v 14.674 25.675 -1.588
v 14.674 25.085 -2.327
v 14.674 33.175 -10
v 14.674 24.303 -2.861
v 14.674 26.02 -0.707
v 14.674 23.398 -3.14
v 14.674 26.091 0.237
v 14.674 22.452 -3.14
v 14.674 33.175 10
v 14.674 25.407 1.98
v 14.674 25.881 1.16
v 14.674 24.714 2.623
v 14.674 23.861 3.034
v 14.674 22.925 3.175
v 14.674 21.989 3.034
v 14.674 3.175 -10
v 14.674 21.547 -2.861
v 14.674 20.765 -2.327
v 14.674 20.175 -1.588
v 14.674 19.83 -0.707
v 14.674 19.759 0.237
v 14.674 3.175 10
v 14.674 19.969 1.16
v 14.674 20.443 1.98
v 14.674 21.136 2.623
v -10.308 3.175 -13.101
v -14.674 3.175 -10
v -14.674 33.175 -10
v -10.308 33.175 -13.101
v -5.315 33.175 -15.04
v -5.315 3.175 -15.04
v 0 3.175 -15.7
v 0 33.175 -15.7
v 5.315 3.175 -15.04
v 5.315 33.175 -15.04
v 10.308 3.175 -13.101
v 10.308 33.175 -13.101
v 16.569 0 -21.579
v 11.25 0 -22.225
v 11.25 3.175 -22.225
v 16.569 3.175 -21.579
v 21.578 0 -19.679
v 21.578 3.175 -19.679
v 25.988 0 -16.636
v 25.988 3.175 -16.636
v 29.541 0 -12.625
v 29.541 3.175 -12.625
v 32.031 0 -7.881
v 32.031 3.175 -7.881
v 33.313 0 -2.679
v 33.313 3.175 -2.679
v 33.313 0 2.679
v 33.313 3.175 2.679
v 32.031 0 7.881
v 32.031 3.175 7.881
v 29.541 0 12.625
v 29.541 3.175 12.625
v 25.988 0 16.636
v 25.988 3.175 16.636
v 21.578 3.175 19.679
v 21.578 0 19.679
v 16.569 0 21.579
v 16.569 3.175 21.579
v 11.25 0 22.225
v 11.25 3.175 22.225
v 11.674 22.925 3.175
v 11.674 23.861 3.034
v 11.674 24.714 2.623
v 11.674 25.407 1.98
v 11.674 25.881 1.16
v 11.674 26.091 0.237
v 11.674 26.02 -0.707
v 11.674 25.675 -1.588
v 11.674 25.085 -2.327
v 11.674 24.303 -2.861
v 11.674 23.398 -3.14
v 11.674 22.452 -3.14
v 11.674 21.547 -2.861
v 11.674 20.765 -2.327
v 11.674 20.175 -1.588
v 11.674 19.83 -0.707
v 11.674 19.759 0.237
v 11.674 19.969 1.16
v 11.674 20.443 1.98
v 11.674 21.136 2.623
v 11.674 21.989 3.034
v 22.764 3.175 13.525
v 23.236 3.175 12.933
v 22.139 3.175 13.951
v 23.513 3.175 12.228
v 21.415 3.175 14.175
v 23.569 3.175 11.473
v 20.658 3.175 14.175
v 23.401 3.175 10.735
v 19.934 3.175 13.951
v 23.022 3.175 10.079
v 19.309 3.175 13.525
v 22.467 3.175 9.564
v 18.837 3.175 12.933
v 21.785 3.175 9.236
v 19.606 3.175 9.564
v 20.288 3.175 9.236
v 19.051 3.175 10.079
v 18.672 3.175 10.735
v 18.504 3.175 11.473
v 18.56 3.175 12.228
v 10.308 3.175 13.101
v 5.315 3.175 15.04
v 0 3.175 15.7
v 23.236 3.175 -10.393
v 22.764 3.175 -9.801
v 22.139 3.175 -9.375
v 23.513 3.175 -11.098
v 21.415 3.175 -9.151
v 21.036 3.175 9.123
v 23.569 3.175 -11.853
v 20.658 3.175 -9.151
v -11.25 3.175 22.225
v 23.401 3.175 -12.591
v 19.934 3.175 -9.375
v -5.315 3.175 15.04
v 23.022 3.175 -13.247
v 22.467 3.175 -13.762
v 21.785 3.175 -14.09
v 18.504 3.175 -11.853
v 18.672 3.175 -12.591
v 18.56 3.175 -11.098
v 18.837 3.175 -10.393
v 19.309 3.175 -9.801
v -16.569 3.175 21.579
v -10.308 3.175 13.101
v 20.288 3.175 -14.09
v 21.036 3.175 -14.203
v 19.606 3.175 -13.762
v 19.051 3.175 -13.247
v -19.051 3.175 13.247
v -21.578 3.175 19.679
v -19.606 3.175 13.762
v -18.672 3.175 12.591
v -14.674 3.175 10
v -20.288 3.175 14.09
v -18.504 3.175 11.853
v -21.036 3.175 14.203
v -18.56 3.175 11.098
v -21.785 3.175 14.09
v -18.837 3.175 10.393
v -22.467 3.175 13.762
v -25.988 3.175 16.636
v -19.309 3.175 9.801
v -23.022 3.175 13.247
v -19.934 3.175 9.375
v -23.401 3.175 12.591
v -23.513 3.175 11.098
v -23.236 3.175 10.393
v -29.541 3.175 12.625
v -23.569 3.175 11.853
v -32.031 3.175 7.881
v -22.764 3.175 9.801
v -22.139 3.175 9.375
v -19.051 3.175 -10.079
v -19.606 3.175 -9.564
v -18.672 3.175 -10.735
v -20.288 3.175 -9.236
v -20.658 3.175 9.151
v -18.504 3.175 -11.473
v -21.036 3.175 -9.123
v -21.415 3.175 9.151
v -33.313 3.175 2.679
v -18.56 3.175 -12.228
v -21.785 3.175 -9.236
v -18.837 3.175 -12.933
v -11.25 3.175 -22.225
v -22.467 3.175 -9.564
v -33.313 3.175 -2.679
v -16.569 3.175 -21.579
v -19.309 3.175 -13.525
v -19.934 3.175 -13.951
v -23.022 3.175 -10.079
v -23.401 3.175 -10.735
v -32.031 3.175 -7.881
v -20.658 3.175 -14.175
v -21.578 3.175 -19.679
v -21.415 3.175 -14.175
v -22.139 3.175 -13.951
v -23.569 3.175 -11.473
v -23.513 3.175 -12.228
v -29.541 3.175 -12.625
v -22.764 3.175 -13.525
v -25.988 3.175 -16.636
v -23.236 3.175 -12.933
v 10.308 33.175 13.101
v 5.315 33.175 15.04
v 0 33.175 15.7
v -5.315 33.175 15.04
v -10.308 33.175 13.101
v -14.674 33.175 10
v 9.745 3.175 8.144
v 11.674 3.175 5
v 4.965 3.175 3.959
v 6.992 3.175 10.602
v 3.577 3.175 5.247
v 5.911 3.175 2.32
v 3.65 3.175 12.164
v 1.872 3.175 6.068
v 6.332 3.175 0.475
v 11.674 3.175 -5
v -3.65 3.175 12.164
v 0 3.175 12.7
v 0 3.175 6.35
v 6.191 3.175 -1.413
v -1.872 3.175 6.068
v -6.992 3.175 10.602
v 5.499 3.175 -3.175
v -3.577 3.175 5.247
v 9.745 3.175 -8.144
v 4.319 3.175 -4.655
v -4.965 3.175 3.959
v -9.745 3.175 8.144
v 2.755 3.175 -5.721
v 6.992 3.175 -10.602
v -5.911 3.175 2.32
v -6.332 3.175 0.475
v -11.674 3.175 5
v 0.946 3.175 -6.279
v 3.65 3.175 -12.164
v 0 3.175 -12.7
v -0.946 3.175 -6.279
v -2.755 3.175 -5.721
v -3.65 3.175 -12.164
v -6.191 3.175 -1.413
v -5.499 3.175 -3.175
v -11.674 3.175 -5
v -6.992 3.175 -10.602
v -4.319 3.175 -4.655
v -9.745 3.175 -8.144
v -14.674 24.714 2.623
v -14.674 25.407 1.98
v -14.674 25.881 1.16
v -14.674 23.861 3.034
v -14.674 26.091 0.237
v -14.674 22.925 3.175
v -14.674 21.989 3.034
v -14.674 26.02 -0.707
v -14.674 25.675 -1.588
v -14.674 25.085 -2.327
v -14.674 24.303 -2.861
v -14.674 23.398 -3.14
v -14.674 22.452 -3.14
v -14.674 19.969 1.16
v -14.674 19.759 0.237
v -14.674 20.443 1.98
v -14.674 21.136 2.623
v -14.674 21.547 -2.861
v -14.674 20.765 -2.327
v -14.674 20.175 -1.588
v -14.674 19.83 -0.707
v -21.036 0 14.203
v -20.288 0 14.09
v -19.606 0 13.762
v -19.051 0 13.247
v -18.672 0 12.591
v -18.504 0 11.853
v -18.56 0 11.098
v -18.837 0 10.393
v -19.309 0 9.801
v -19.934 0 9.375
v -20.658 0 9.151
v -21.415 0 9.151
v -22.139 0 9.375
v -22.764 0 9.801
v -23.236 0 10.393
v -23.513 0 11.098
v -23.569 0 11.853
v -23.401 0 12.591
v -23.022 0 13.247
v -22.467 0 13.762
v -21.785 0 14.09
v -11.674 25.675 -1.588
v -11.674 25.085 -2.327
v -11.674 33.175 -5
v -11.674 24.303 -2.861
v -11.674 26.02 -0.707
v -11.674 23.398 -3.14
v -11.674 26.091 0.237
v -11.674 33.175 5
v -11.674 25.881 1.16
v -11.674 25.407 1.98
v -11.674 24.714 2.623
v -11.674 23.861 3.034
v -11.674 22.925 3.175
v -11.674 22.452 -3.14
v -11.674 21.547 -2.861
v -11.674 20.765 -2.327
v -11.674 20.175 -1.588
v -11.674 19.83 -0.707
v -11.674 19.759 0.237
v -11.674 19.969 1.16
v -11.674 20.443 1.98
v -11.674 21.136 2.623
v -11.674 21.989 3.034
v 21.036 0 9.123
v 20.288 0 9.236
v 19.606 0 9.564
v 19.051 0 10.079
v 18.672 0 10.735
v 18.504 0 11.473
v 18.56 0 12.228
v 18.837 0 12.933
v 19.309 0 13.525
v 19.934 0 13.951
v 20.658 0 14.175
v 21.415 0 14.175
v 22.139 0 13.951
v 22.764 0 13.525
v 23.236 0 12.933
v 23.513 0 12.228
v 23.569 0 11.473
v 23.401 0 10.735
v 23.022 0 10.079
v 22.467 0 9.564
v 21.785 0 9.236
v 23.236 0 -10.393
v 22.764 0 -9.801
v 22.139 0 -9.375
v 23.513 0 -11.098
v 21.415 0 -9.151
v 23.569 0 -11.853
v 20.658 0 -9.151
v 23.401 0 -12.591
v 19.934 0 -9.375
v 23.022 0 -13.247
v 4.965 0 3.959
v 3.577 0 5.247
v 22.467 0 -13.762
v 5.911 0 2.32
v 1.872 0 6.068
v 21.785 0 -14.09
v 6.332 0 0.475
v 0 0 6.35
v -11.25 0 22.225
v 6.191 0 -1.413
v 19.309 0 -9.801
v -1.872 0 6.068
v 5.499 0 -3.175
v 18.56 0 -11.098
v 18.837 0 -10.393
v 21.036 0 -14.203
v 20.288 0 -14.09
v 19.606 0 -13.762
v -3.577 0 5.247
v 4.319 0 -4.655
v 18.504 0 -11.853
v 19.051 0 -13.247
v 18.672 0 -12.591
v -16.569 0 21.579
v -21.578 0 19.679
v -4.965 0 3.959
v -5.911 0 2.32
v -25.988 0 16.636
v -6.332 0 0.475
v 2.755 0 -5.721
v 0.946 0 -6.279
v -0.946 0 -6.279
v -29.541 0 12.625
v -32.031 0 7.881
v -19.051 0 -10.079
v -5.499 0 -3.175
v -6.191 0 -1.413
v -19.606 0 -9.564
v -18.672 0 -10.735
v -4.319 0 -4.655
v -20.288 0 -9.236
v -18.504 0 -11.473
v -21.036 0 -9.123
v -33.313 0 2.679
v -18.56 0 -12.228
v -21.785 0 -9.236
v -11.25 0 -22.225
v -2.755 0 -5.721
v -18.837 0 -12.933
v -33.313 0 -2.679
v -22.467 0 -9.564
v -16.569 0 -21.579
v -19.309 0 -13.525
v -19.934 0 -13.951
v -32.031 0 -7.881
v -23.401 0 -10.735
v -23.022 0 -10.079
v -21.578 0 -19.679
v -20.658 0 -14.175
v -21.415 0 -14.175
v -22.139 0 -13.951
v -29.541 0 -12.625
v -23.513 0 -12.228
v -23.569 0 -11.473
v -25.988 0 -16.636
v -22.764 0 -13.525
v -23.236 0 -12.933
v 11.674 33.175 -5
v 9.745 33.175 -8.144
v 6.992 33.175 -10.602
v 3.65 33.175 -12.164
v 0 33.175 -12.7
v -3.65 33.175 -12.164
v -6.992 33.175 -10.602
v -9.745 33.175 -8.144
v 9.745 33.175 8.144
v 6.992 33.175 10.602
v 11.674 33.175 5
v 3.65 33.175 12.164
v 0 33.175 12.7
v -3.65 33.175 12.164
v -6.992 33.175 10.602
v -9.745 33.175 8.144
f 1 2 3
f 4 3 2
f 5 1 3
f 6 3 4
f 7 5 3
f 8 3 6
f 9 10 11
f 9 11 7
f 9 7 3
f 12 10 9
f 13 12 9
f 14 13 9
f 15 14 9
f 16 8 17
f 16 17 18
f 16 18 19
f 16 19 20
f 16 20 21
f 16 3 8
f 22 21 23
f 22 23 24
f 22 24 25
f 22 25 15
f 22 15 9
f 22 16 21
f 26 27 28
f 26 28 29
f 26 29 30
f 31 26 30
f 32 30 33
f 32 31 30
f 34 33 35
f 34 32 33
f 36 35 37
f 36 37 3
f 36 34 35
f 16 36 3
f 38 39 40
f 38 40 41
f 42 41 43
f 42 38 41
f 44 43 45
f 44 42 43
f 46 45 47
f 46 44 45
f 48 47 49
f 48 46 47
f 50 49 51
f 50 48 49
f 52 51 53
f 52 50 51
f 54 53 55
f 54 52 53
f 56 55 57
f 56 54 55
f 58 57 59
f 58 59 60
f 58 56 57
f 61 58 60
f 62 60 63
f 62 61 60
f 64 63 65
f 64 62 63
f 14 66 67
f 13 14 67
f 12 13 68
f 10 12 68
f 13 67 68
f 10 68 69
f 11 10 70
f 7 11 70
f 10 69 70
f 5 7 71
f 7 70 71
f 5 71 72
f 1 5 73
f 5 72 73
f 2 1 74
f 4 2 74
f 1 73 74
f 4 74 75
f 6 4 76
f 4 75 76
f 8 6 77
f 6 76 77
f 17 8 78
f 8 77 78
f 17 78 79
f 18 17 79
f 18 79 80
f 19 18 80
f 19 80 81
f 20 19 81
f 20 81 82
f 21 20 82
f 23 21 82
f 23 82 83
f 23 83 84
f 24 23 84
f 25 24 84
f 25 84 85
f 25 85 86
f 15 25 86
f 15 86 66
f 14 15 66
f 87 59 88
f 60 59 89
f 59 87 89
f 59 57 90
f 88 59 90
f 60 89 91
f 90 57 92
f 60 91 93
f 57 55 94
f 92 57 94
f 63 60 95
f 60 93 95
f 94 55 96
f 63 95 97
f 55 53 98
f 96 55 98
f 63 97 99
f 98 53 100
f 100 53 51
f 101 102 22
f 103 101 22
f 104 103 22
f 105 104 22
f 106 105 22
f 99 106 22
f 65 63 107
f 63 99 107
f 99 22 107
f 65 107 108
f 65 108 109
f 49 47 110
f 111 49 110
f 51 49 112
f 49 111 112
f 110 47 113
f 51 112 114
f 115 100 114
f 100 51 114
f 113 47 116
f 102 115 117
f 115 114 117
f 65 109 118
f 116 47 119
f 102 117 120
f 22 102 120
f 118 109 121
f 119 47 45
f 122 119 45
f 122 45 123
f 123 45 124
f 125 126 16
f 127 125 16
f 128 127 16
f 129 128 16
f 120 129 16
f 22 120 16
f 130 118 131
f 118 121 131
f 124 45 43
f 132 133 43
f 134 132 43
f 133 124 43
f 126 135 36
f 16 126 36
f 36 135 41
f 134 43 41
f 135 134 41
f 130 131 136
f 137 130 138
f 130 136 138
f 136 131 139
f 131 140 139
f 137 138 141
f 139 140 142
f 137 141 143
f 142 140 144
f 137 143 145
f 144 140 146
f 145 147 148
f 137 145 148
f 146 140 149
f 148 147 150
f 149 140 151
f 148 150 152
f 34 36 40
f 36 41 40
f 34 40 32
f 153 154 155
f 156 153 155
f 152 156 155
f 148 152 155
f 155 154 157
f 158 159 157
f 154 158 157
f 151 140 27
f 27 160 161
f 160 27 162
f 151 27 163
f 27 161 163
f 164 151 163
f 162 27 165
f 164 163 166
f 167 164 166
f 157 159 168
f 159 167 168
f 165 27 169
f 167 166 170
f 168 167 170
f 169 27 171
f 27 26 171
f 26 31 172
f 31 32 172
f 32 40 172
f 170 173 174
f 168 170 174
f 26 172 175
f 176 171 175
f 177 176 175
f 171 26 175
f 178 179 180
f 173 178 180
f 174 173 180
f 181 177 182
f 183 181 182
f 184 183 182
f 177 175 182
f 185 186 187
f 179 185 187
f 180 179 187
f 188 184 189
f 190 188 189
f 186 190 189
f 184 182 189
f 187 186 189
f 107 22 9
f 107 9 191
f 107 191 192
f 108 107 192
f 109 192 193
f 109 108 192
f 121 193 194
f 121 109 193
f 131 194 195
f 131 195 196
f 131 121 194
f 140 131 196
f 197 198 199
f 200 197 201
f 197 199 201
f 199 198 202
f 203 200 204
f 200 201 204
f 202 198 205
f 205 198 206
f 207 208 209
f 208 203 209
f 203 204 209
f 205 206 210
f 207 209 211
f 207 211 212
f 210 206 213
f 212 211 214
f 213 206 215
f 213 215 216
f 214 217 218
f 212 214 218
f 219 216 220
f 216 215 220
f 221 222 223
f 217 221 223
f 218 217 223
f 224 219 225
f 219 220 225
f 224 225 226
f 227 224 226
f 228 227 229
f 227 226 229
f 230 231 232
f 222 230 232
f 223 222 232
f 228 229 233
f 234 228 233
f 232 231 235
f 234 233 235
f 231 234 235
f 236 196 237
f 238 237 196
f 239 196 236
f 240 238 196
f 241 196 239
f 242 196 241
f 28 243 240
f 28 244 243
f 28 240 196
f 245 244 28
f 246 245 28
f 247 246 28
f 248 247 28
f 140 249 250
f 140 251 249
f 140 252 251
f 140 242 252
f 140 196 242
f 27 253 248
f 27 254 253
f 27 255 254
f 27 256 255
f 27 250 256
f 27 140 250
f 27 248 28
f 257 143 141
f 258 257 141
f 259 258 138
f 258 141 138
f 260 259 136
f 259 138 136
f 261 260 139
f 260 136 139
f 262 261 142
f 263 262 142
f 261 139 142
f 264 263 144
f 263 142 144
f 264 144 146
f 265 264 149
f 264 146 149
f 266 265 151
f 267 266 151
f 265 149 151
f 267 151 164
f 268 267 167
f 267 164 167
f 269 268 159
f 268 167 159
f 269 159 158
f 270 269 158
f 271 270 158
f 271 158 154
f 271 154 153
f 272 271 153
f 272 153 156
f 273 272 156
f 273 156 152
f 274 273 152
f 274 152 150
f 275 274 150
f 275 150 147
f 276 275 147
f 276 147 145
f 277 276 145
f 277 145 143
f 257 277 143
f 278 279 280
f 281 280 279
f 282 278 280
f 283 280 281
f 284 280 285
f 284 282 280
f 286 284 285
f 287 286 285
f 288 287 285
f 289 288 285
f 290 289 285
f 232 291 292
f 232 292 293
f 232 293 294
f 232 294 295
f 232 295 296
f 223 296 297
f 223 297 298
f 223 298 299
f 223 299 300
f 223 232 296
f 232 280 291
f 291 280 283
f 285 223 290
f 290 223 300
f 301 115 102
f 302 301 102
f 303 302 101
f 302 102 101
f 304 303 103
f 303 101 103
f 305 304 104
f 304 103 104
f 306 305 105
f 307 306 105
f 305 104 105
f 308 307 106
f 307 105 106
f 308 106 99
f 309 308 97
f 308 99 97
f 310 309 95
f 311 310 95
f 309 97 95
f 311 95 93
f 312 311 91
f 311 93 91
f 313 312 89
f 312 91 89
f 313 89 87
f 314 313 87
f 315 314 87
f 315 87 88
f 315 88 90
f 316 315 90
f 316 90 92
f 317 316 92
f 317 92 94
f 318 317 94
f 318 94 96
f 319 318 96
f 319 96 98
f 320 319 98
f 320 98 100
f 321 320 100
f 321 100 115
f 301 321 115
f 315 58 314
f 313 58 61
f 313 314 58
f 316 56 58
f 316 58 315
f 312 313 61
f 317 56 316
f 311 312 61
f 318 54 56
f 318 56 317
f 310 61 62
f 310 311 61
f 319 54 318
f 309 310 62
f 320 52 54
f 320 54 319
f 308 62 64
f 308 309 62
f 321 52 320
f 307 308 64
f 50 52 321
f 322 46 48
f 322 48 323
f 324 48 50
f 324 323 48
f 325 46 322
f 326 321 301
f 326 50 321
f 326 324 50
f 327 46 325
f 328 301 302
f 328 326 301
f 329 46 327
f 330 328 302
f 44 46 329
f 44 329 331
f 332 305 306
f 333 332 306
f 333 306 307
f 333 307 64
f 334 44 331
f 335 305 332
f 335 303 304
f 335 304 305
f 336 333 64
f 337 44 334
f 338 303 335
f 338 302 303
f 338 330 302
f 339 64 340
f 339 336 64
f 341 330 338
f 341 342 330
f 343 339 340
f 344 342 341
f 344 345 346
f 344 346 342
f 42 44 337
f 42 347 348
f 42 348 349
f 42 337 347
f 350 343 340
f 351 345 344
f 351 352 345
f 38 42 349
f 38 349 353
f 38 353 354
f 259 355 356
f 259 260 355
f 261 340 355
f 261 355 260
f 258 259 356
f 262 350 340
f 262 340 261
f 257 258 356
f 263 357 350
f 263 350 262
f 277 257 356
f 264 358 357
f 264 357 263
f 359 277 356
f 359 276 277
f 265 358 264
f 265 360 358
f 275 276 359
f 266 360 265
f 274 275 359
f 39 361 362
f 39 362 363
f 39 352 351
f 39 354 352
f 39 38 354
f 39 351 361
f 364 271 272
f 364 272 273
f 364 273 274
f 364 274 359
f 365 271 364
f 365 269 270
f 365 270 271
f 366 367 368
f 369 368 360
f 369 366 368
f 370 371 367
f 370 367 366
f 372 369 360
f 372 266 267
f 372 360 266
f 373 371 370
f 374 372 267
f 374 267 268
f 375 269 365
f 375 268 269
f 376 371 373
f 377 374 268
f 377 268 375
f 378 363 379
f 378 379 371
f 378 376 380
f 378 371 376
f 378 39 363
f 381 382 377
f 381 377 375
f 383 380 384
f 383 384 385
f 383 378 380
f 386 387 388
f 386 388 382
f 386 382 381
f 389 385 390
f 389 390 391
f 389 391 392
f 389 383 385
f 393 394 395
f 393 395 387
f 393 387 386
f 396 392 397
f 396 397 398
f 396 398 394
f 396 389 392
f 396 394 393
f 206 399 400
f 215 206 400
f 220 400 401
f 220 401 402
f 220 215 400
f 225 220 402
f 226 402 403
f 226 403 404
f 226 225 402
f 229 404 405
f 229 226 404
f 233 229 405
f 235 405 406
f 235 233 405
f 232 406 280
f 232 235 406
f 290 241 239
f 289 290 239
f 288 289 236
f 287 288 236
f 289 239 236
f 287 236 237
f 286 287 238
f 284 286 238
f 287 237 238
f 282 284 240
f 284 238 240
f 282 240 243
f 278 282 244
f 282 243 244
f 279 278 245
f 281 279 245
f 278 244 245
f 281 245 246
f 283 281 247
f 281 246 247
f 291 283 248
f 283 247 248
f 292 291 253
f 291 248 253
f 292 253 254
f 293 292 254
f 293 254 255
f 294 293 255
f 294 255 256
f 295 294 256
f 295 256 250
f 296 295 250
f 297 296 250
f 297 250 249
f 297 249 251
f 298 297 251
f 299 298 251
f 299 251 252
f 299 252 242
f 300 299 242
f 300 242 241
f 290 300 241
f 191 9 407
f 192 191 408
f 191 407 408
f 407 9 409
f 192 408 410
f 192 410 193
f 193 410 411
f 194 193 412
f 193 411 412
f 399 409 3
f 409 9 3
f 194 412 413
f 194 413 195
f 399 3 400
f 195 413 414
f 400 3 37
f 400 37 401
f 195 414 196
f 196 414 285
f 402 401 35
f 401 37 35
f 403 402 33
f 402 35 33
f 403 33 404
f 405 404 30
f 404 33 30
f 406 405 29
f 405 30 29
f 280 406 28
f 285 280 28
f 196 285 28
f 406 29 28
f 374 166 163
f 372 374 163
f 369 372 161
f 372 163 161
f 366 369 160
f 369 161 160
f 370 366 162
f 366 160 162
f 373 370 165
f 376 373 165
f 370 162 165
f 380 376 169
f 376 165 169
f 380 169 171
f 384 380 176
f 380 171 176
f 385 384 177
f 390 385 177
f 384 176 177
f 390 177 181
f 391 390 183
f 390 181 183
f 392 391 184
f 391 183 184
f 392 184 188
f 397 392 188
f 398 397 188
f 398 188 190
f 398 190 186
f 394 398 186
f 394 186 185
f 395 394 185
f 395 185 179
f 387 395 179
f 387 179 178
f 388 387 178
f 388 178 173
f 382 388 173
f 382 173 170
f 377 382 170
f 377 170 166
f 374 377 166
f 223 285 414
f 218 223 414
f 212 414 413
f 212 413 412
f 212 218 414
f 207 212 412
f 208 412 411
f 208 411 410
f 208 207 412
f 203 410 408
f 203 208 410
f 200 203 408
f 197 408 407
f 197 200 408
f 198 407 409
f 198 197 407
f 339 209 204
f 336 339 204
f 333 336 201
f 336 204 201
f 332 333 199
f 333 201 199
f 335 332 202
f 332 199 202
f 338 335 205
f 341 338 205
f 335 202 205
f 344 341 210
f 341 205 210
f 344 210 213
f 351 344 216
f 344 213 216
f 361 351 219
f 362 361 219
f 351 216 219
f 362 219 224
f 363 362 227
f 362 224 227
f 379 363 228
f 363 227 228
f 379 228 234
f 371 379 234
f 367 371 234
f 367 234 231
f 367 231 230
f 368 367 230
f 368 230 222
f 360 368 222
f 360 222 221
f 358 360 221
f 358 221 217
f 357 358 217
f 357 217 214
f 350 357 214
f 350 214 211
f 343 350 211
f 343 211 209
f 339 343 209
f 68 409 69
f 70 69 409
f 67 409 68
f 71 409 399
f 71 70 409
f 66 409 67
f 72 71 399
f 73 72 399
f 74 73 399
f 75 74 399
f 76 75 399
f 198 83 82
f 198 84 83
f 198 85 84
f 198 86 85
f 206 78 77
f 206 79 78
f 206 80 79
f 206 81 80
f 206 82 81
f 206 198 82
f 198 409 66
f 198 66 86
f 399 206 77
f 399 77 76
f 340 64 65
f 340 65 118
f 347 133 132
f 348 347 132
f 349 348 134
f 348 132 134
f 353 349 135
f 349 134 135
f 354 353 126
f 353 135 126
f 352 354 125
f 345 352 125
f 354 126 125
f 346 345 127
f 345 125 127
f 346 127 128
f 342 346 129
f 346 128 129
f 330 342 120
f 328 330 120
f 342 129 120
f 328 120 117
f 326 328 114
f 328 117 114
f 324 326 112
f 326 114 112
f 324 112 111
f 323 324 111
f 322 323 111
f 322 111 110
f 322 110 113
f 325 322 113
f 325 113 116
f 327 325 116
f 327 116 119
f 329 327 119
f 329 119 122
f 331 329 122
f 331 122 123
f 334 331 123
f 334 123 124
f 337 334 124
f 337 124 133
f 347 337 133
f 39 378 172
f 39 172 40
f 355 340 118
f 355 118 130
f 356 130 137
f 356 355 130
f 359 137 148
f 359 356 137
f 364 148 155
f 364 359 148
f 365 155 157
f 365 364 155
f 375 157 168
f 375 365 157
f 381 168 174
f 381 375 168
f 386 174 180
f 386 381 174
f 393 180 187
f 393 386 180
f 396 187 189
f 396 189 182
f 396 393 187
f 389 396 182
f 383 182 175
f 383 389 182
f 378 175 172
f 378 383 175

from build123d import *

# Parameters (mm, degrees)
BOSS_EXTRUDE1_DEPTH = 3.175
SKETCH2_R           = 2.54
CUT_EXTRUDE1_DEPTH  = 41.306412331
BOSS_EXTRUDE2_DEPTH = 30
SKETCH4_R           = 6.35
CUT_EXTRUDE2_DEPTH  = 51.145052099
SKETCH6_R           = 3.175
CUT_EXTRUDE3_DEPTH  = 66.447021029


with BuildPart() as part:
    # Sketch1 → Boss-Extrude1 (new body)
    with BuildSketch(Plane(origin=(0, 0, 0), x_dir=(1, 0, 0), z_dir=(0, 1, 0))):
        with BuildLine():
            Line((-11.25, 22.225), (11.25, 22.225))
            ThreePointArc((11.25, 22.225), (33.475, 0), (11.25, -22.225))
            Line((11.25, -22.225), (-11.25, -22.225))
            ThreePointArc((-11.25, -22.225), (-33.475, 0), (-11.25, 22.225))
        make_face()
    extrude(amount=BOSS_EXTRUDE1_DEPTH)

    # Sketch2 → Cut-Extrude1 (cut, through all)
    with BuildSketch(Plane(origin=(0, 3.175, 0), x_dir=(1, 0, 0), z_dir=(0, 1, 0))):
        with Locations(Location((-21.036441357, -11.663026646, 0), (0, 0, 270))):
            Circle(SKETCH2_R)
        with Locations(Location((-21.036441357, 11.663026646, 0), (0, 0, 270))):
            Circle(SKETCH2_R)
        with Locations(Location((21.036441357, -11.663026646, 0), (0, 0, 90))):
            Circle(SKETCH2_R)
        with Locations(Location((21.036441357, 11.663026646, 0), (0, 0, 90))):
            Circle(SKETCH2_R)
    extrude(amount=-CUT_EXTRUDE1_DEPTH, mode=Mode.SUBTRACT)

    # Sketch3 → Boss-Extrude2 (add)
    with BuildSketch(Plane(origin=(0, 3.175, 0), x_dir=(1, 0, 0), z_dir=(0, 1, 0))):
        with BuildLine():
            Line((-14.674330816, -10), (-14.674330816, 10))
            ThreePointArc((-14.674330816, 10), (0, 15.7), (14.674330816, 10))
            Line((14.674330816, 10), (14.674330816, -10))
            ThreePointArc((14.674330816, -10), (0, -15.7), (-14.674330816, -10))
        make_face()
        with BuildLine():
            Line((-11.674330816, 5), (-11.674330816, -5))
            ThreePointArc((-11.674330816, -5), (0, -12.7), (11.674330816, -5))
            Line((11.674330816, -5), (11.674330816, 5))
            ThreePointArc((11.674330816, 5), (0, 12.7), (-11.674330816, 5))
        make_face(mode=Mode.SUBTRACT)
    extrude(amount=BOSS_EXTRUDE2_DEPTH)

    # Sketch4 → Cut-Extrude2 (cut, through all)
    with BuildSketch(Plane(origin=(0, 3.175, 0), x_dir=(1, 0, 0), z_dir=(0, 1, 0))):
        with Locations(Location((0, 0, 0), (0, 0, 270))):
            Circle(SKETCH4_R)
    extrude(amount=-CUT_EXTRUDE2_DEPTH, mode=Mode.SUBTRACT)

    # Sketch6 → Cut-Extrude3 (cut, through all)
    with BuildSketch(Plane(origin=(-14.674330816, 2.247424982, 9.530938138), x_dir=(0, 0, 1), z_dir=(-1, 0, 0))):
        with Locations((-9.530938138, 20.677575018)):
            Circle(SKETCH6_R)
    extrude(amount=-CUT_EXTRUDE3_DEPTH, mode=Mode.SUBTRACT)


solid = part.part
